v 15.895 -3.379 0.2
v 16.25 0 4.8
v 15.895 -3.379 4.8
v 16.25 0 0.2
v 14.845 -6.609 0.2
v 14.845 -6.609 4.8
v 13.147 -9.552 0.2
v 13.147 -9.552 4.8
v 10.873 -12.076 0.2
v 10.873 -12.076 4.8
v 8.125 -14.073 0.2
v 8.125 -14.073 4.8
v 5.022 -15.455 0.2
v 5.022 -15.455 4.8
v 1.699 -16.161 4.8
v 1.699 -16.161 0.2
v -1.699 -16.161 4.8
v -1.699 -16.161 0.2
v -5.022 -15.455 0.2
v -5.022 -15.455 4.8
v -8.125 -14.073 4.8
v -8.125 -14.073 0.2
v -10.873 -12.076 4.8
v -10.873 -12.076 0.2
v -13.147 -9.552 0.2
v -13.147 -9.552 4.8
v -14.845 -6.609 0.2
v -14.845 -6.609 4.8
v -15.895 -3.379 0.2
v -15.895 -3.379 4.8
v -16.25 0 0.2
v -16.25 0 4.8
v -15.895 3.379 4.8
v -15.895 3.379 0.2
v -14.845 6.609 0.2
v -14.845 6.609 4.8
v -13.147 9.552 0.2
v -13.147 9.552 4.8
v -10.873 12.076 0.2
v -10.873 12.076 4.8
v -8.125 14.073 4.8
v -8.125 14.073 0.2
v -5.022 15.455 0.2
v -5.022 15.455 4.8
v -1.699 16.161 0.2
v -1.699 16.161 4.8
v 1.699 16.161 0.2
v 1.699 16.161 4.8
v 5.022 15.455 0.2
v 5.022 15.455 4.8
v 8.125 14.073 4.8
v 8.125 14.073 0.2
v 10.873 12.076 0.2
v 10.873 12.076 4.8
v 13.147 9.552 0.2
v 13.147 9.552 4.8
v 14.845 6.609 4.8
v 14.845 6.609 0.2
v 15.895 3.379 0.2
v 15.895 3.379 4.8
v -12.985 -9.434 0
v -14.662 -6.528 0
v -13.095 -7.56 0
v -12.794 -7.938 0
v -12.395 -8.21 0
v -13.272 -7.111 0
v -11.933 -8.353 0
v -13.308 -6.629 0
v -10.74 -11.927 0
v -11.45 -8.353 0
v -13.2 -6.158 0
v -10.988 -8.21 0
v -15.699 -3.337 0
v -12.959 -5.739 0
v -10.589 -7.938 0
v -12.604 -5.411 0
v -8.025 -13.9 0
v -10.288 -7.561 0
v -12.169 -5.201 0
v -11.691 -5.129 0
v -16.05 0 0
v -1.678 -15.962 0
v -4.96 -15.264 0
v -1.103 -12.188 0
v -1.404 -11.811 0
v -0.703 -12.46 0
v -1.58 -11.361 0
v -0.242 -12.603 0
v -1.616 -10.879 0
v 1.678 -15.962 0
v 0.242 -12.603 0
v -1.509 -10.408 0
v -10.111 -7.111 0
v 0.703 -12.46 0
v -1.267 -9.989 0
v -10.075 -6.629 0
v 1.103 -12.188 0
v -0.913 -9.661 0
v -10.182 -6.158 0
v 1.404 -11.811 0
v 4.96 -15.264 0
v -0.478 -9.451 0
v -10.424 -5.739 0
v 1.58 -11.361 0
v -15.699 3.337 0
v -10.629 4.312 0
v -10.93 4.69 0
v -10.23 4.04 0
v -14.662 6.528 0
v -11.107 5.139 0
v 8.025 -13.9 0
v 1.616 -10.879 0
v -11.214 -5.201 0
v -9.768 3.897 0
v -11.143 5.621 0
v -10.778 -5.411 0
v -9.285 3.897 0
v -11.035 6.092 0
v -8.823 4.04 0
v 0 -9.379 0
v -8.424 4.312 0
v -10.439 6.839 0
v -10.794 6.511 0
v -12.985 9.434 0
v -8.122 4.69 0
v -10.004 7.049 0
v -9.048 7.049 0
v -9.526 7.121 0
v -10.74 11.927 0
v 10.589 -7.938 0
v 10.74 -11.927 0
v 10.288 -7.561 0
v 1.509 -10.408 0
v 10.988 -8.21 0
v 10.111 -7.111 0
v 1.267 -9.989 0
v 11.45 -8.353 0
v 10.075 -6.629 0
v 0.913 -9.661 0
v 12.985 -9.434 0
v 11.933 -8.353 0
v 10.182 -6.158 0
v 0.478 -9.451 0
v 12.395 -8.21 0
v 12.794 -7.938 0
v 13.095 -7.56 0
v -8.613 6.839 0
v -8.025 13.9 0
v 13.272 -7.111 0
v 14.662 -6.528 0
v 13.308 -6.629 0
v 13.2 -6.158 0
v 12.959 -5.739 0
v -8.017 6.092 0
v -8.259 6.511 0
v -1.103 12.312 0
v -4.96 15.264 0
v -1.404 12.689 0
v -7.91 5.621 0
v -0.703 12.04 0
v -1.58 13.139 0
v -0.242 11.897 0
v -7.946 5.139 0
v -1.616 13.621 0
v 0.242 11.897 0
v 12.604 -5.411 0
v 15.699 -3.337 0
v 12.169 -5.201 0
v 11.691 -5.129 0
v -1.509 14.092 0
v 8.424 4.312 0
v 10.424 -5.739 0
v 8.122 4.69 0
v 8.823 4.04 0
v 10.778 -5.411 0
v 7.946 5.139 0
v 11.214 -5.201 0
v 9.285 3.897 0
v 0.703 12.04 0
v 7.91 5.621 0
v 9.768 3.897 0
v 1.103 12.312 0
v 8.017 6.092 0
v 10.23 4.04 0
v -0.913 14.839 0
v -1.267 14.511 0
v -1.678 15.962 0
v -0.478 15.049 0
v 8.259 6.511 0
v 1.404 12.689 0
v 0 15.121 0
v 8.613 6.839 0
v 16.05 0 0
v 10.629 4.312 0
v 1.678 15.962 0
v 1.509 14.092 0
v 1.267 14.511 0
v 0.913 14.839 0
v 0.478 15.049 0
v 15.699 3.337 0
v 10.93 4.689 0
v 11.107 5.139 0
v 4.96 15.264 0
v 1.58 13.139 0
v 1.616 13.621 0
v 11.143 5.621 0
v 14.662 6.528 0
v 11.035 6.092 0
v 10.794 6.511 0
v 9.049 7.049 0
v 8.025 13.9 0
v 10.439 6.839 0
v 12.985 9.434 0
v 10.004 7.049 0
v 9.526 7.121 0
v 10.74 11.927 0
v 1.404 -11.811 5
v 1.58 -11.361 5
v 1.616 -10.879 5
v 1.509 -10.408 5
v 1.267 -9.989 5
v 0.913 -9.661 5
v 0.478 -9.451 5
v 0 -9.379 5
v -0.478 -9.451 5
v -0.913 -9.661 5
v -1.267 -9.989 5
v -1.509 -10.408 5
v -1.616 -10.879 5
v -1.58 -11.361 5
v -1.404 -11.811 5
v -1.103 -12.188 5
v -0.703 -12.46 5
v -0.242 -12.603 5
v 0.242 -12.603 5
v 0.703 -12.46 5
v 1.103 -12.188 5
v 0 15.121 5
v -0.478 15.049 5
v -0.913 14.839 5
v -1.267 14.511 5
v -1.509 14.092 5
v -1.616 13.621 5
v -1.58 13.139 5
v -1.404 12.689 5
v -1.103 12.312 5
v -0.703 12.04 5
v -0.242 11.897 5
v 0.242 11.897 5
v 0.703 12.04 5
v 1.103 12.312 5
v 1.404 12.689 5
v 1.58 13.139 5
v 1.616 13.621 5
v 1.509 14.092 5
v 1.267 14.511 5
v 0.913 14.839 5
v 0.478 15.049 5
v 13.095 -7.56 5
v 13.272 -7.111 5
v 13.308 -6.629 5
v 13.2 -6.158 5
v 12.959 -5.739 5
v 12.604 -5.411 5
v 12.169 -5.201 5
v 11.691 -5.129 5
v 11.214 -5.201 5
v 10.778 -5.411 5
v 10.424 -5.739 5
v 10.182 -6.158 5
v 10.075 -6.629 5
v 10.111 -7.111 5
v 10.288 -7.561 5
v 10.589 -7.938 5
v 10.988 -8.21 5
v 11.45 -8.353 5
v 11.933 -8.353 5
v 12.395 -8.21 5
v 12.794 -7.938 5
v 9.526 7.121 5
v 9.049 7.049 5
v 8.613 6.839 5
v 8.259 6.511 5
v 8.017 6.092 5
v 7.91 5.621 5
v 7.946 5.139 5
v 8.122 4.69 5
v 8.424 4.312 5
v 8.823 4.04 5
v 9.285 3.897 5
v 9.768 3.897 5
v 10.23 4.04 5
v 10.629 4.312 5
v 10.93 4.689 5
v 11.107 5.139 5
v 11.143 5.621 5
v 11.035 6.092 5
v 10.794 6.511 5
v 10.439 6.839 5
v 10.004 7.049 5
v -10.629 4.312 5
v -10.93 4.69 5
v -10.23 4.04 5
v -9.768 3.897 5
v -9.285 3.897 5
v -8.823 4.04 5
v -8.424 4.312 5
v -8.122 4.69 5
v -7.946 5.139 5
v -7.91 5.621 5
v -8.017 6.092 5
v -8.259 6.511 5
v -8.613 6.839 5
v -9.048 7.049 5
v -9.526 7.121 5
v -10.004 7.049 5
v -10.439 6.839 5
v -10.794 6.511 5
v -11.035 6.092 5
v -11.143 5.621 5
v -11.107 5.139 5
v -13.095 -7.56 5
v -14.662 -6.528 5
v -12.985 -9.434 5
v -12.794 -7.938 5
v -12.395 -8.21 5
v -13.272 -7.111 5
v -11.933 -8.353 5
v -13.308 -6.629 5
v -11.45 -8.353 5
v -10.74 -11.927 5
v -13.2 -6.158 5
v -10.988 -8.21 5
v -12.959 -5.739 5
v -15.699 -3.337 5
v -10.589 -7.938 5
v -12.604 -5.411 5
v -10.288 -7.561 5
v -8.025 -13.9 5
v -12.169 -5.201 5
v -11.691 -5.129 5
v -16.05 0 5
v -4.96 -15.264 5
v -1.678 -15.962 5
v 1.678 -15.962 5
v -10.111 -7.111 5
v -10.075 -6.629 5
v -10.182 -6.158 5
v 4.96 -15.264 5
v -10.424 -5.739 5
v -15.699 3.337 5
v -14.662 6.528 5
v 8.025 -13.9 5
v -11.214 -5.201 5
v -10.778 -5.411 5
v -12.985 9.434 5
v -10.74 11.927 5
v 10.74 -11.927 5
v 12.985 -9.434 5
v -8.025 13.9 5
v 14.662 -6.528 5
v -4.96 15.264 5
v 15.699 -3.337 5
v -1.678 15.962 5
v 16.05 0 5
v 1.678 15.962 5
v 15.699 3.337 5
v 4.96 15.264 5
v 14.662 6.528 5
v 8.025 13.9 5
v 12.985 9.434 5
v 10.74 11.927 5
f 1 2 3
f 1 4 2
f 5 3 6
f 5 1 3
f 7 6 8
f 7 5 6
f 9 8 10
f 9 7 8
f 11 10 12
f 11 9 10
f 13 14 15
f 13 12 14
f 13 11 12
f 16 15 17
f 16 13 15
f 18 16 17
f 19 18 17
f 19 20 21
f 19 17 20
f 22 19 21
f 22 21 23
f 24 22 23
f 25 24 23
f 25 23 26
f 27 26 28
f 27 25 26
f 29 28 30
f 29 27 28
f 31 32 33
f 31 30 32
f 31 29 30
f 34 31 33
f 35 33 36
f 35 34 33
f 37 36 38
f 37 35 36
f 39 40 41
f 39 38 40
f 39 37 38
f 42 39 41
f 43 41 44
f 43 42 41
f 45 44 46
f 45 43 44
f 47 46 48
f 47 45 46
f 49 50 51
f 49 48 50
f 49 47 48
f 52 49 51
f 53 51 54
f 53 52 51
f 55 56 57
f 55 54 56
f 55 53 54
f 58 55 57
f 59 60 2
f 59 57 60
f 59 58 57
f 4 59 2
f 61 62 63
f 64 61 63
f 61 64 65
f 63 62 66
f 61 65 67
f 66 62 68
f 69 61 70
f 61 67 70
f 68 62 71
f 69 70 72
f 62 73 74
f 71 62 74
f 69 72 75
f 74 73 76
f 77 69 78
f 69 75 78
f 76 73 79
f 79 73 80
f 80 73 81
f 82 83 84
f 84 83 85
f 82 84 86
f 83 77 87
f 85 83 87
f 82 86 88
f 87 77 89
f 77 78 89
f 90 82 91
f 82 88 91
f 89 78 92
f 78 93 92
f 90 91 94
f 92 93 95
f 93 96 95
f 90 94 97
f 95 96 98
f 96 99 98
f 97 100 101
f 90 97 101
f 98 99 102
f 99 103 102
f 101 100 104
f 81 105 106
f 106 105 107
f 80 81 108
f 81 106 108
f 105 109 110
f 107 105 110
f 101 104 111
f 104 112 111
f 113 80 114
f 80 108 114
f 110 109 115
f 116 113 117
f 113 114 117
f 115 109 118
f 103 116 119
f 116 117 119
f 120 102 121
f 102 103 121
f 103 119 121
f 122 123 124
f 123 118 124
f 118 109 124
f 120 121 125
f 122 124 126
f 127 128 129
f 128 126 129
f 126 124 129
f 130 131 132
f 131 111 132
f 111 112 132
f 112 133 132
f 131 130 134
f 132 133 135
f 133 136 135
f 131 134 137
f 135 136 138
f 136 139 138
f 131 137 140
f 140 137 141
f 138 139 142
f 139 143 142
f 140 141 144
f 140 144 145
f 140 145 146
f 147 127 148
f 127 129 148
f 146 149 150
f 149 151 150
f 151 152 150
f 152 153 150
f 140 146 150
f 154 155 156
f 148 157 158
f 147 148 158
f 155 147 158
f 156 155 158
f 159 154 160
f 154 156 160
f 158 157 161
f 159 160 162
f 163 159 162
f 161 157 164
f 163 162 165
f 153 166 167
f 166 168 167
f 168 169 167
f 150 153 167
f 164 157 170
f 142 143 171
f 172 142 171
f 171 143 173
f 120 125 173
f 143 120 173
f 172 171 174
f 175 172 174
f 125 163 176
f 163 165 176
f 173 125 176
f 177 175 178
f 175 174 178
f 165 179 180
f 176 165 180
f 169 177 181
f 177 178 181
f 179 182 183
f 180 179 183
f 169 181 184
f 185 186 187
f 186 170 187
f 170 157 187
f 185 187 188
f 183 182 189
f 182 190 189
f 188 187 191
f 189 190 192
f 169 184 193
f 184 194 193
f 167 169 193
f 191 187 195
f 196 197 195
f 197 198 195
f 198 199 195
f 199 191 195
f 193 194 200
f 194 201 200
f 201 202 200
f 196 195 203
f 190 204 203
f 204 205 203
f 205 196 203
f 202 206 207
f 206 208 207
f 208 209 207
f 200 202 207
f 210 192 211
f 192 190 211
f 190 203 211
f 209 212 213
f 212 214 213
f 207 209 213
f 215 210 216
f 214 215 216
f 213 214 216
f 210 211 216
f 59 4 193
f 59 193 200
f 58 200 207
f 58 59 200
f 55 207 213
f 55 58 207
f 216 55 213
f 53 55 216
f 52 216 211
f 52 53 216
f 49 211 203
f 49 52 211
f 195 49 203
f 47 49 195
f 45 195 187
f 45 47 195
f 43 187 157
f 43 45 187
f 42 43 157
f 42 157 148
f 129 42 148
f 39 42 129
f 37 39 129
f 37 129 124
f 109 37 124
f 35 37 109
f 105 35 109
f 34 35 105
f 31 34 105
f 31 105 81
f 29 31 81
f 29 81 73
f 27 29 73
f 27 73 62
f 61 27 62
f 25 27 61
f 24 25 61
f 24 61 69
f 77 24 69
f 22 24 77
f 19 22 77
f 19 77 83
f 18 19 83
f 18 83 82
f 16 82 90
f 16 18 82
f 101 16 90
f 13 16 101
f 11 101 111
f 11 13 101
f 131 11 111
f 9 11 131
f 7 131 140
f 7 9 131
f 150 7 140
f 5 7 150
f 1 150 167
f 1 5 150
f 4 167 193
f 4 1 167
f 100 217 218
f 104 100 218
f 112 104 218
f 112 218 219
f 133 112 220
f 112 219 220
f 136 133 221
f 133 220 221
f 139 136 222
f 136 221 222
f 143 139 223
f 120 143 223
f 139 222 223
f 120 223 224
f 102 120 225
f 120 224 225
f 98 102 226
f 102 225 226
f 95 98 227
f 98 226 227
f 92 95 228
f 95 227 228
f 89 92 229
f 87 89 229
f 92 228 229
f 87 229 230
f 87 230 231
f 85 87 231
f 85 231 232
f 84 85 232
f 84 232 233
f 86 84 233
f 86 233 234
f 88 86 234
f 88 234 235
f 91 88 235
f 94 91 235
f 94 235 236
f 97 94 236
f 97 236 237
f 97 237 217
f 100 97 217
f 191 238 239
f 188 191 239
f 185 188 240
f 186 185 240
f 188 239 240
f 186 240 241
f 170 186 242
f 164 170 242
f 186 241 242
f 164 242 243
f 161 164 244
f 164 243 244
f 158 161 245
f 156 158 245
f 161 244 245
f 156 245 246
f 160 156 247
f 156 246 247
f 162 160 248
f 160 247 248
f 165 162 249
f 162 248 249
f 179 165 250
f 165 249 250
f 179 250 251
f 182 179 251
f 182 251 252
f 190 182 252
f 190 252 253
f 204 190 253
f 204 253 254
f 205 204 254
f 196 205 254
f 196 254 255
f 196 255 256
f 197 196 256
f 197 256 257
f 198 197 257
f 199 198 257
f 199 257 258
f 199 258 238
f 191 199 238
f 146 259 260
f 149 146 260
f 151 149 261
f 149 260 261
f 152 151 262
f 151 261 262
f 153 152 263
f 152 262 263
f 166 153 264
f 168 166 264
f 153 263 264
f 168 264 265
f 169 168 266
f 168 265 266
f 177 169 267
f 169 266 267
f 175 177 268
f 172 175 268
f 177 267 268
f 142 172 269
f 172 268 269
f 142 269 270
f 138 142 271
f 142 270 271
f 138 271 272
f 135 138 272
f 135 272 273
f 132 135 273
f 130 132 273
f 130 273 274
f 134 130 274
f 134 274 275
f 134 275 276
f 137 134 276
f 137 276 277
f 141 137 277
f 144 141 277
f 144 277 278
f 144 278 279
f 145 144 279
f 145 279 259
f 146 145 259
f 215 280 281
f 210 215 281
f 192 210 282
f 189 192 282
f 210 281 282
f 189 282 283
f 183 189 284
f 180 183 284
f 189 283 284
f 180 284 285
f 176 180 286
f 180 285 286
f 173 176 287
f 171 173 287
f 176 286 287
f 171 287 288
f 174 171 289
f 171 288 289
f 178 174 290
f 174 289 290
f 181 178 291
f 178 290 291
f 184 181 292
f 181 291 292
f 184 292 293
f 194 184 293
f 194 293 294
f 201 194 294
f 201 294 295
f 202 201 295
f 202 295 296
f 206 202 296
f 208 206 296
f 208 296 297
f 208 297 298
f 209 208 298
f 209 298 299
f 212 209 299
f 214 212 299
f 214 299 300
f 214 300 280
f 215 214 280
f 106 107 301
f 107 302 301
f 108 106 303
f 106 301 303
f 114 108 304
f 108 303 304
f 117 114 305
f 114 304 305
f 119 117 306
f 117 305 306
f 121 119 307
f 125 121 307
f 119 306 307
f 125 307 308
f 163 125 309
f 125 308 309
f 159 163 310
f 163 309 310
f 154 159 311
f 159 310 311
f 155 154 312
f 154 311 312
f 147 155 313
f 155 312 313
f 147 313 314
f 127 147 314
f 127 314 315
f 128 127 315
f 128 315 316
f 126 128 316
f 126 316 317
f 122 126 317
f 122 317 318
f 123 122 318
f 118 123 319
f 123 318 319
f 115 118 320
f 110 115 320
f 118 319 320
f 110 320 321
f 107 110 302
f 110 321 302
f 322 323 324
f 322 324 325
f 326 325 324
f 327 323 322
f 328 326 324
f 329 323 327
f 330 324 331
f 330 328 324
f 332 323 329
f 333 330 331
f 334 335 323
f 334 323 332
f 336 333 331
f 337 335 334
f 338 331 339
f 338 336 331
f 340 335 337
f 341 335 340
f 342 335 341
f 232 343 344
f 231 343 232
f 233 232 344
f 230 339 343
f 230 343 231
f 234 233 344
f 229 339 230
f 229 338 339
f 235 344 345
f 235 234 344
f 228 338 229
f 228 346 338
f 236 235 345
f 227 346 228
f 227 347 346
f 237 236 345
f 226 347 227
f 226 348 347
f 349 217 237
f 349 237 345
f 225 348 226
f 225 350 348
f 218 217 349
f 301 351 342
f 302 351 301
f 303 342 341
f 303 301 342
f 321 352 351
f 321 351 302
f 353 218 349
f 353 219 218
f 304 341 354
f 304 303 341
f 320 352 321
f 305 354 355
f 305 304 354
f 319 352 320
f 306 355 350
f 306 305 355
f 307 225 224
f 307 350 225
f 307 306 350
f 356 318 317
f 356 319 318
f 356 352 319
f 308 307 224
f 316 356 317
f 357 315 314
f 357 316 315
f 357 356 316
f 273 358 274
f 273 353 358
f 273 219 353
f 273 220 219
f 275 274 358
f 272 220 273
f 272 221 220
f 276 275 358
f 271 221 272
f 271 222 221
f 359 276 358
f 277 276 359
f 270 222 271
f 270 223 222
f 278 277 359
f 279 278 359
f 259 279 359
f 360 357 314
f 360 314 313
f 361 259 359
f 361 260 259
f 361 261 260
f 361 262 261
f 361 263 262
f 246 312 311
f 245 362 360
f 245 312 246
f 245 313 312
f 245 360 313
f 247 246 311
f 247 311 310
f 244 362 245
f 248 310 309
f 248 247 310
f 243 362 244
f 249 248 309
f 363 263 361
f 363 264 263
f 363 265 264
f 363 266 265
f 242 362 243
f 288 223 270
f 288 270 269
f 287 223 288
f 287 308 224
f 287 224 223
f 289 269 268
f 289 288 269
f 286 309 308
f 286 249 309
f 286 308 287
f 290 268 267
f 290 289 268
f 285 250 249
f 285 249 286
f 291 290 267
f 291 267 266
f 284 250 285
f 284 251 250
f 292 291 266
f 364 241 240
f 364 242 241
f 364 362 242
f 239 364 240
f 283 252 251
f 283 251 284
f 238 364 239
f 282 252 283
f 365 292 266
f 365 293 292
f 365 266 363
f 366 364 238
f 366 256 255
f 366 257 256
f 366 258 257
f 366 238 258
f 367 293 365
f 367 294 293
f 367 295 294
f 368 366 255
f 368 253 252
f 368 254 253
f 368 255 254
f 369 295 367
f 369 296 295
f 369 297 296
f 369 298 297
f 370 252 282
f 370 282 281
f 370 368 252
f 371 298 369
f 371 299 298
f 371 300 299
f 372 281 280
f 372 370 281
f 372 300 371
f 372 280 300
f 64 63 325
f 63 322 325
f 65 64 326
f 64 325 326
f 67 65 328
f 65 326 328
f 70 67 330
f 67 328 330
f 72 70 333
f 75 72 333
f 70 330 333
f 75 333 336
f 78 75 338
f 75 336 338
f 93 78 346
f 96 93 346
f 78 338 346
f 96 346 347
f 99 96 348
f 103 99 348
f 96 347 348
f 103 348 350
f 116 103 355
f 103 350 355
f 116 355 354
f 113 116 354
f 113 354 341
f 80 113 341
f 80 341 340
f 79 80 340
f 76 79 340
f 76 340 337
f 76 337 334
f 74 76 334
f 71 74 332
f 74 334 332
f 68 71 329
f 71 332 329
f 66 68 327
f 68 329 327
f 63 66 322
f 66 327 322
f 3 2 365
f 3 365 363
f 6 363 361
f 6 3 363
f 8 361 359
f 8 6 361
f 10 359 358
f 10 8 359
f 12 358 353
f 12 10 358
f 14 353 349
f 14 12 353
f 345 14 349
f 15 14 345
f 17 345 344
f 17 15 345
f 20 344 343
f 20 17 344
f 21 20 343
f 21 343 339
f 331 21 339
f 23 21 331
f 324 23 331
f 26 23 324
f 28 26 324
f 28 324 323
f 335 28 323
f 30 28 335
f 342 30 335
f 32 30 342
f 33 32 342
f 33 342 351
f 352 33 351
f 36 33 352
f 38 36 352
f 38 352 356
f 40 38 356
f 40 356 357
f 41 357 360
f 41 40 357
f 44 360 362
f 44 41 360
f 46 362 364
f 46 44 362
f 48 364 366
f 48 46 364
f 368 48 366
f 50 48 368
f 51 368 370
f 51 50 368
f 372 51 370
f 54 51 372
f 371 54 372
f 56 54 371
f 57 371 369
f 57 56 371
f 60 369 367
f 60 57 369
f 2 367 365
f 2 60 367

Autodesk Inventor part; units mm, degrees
ref_plane "YZ Plane" through (0, 0, 0) normal (1, 0, 0) x (0, 1, 0)
ref_plane "XZ Plane" through (0, 0, 0) normal (0, 1, 0) x (-1, 0, 0)
ref_plane "XY Plane" through (0, 0, 0) normal (0, 0, 1) x (1, 0, 0)
sketch "Sketch1" plane through (0, 0, 0) normal (0, 0, 1) x (1, 0, 0)
  circle A0 centre (0, 0) radius 16.25
  circle A1 centre (0, 0) radius 13.5 construction
  circle A2 centre (0, 0) radius 11 construction
  line L0 (0, 13.5) -> (0, 0) construction
  line L1 (0, 0) -> (9.5263, 5.5) construction
  dimension "d2" = 22
  dimension "d0" = 32.5
  dimension "d1" = 27
  dimension "d3" = 60
extrude "Extrusion1" add sketch "Sketch1" along normal blind 5
hole "Hole1" at (0, 13.5, 0) at (9.5263, 5.5, 0) direction (0, 0, 1) diameter 3.242 depth 5 thread size "M4x0.7" class "6H" standard "ANSI Metric M Profile"
pattern_circular "Circular Pattern1" count 3 over 360 about axis through (0, 0, 0) along (0, 0, 1) of "Hole1"
chamfer "Chamfer1" distance 0.2 angle 45 2 edges at (-16.25, 0, 5) (-16.25, 0, 0)
equation "\"d2\" = holesid"
equation "\"holesid\" = 22"
properties part number "flange-adapter" material "Stainless Steel"
